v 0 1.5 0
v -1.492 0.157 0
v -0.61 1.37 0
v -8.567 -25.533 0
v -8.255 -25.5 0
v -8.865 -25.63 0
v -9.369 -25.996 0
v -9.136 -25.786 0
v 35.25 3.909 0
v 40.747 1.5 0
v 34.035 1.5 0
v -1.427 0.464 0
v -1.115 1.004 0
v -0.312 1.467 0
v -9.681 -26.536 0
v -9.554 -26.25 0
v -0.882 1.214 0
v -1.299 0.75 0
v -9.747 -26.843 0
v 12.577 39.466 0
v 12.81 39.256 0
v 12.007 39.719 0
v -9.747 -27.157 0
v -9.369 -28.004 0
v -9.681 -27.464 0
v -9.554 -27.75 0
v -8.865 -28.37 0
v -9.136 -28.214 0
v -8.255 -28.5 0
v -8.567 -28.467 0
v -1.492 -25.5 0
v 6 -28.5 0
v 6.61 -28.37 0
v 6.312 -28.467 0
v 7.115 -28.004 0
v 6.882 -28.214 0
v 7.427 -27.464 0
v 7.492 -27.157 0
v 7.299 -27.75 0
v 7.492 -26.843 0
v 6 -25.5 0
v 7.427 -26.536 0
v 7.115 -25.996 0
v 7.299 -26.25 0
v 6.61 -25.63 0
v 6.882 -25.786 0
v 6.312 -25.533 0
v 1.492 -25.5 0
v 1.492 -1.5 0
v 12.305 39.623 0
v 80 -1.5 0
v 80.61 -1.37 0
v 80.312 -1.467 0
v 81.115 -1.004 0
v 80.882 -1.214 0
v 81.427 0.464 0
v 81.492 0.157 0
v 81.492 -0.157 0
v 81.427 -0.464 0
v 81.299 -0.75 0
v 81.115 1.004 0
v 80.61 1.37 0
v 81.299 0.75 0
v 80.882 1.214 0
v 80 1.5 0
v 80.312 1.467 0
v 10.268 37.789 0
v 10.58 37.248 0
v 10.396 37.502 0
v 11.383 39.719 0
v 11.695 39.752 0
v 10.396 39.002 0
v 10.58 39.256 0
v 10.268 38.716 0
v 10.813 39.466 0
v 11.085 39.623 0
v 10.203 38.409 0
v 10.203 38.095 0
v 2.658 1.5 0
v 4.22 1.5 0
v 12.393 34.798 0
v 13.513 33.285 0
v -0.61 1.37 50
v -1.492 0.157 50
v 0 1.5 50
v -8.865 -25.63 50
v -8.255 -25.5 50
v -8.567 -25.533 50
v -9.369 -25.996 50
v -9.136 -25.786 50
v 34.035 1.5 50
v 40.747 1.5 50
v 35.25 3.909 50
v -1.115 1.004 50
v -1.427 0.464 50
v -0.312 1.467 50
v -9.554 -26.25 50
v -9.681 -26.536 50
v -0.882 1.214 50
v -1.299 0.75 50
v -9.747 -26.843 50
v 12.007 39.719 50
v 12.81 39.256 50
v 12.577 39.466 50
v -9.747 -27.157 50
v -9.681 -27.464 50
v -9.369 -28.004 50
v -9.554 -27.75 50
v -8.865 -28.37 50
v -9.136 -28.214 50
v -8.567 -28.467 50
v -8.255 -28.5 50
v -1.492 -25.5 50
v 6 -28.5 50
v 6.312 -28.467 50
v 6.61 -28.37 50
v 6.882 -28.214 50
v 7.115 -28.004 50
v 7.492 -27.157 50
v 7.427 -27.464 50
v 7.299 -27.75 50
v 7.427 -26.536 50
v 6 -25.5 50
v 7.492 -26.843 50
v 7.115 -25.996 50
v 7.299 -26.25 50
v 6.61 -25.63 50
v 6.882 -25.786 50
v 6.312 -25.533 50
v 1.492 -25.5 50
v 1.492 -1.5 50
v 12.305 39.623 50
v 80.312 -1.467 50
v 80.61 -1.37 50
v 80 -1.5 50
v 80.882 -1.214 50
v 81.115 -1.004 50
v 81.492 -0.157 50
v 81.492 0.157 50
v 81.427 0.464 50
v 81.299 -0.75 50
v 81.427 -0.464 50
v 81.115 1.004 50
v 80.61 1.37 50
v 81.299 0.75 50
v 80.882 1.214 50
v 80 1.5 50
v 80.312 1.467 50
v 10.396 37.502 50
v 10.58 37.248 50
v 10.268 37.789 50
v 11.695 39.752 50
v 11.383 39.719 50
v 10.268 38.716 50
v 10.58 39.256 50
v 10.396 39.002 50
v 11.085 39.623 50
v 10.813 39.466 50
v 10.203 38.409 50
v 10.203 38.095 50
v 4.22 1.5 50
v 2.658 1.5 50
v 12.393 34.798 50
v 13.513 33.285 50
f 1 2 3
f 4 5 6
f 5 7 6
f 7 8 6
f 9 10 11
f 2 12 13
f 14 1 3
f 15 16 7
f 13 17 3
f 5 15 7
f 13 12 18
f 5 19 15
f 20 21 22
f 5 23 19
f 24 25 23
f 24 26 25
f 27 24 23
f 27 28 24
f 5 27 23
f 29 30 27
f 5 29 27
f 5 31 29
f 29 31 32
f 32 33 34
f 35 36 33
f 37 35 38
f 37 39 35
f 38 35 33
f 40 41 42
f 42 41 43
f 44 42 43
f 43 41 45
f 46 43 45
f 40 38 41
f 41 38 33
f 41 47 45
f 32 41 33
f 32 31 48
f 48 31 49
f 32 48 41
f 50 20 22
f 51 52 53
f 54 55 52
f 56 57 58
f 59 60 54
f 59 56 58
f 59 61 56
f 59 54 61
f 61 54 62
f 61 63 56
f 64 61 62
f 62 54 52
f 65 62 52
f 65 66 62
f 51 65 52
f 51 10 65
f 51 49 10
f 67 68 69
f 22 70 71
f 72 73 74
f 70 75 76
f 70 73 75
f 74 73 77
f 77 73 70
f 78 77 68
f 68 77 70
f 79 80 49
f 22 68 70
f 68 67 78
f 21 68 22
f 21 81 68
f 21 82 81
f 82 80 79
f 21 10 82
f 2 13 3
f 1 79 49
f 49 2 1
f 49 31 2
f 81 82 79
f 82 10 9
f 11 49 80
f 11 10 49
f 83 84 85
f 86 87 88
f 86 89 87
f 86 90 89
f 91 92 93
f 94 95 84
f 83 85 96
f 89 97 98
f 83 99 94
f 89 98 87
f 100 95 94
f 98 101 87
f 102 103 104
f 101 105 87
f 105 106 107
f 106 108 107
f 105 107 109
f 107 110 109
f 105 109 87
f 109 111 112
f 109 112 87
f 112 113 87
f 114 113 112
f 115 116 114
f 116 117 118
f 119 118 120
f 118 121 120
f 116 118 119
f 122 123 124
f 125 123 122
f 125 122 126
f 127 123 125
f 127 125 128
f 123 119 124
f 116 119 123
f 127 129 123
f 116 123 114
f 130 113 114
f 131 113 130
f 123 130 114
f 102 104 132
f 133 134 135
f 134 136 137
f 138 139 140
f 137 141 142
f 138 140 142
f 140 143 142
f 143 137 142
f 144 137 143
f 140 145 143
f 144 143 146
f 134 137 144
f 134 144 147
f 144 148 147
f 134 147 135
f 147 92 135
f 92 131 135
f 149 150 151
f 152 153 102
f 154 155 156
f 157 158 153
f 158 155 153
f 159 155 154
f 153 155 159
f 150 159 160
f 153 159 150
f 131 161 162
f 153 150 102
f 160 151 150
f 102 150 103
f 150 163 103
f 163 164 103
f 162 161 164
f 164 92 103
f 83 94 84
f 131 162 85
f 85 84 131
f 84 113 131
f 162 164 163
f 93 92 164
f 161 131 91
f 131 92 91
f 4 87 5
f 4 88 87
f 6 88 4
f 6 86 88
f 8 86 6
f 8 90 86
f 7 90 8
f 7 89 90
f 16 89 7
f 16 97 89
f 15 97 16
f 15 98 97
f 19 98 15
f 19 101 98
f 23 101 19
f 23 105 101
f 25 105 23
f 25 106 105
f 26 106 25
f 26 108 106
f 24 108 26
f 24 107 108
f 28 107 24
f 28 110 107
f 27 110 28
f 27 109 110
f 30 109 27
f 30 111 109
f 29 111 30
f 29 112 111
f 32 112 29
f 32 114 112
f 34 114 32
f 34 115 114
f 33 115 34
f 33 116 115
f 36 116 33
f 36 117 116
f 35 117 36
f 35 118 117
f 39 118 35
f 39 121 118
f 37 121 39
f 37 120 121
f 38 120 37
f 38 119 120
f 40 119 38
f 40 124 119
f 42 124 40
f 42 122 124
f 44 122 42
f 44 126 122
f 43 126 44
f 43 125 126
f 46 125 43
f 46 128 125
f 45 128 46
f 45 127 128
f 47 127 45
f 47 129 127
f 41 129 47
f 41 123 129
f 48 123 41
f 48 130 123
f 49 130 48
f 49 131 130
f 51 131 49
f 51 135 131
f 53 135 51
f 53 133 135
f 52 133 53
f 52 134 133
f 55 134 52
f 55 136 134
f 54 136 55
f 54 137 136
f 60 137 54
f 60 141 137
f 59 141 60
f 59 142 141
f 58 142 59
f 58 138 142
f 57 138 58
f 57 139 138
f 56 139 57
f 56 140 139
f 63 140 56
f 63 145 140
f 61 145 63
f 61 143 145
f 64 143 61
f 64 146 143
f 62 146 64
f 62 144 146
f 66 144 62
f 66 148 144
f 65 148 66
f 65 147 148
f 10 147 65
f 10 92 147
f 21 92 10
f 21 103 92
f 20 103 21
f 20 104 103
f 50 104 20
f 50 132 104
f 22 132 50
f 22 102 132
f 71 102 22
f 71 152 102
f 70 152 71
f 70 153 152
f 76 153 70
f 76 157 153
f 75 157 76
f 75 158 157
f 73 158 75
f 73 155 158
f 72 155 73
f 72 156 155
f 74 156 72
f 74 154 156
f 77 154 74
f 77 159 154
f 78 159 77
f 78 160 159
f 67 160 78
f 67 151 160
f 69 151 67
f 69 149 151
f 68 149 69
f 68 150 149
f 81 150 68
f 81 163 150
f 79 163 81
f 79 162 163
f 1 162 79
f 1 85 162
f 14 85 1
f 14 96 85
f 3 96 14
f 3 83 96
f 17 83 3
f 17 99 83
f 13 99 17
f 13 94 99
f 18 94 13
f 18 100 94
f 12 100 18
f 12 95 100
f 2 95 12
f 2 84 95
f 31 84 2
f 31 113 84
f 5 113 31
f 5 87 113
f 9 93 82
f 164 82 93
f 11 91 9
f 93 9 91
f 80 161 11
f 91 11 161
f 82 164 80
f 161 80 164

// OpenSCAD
//CUSTOMIZER VARIABLES

// The width of the stand when looking from the front
stand_width = 50;

// The depth of the spot in which the stood object sits
bottom_depth = 24;

// The height of the stand measured up the backrest
backrest_height = 80;

// The angle that the stood object leans back
lean_angle = 17;

// The distance between the points of contact when the stand is leaned back
base_distance = 40;

// The height at which the prop intersects with the backrest
join_height = 40;

// The height of the lip
lip_height = 6;

// The thickness of all parts of the stand
structure_thickness = 3;

// Whether to place an edge holder on the side(s) of the stand
edge_holder = 0; // [0:None, 1:Left, 2:Right, 3:Both]

//CUSTOMIZER VARIABLES END

module stand(width=stand_width, depth=bottom_depth, height=backrest_height, angle=lean_angle, base=base_distance, join=join_height, lip=lip_height, thickness=structure_thickness, edge=edge_holder) {
    backrest_top = [0,height,0];
    backrest_bottom = [0,0,0];
    holder_front = [depth+thickness,0,0];
    lip_top = [holder_front[0],lip,0];
    lip_bottom = [holder_front[0],-(depth+thickness)*tan(angle),0];
    prop_join = [0,join,0];
    prop_bottom = [-cos(angle)*base,sin(angle)*base,0];
    prop_angle = atan2(cos(angle)*base,join-sin(angle)*base);
    fillet_angle = prop_angle/2;
    fillet_end = [-tan(prop_angle)*thickness,prop_join[1]-thickness,0];
    fillet_join = [prop_join[0],fillet_end[1]-tan(fillet_angle)*(tan(prop_angle)*thickness),0];
    strut_end = [prop_bottom[0]+cos(90-prop_angle)*thickness,prop_bottom[1]+sin(90-prop_angle)*thickness,0];
    strut_join = [0,thickness,0];

    // Add some width to accomodate the edges, if included
    total_width = width + ((edge == 1 || edge == 3) ? thickness : 0) + ((edge == 2 || edge == 3) ? thickness : 0);
    
    // Flip the whole thing over for easier printing if there's a holder on the left side
    rotate_all = edge == 1 ? [0, 180, 0] : [0, 0, 0];
    translate_all = edge == 1 ? [0, 0, total_width] : [0, 0, 0];

    translate(translate_all) rotate(rotate_all) {
        linear_extrude(height = total_width)
        {
            // Backrest
            hull() {
                translate(backrest_top) circle(d=thickness);
                translate(backrest_bottom) circle(d=thickness);
            }
            // Stand
            hull() {
                translate(prop_join) circle(d=thickness);
                //translate([prop_join[0],max(prop_join[1], 0),prop_join[2]]) circle(d=thickness);
                translate(prop_bottom) circle(d=thickness);
            }
            // Fillet
            hull() {
                translate(fillet_join) circle(d=thickness);
                translate(fillet_end) circle(d=thickness);
            }
            // Strut
            hull () {
                translate(strut_join) circle(d=thickness/2);
                translate(strut_end) circle(d=thickness/2);
            }
            // Holder
            hull() {
                translate(backrest_bottom) circle(d=thickness);
                translate(holder_front) circle(d=thickness);
            }
            // Lip
            hull() {
//                translate(holder_front) circle(d=thickness);
                translate(lip_top) circle(d=thickness);
                translate(lip_bottom) circle(d=thickness);
            }
        }
        // Left edge holder
        if (edge == 1 || edge == 3) {
            translate([0, 0, total_width - thickness]) linear_extrude(height = thickness)
            hull() {
                translate(backrest_top) circle(d=thickness);
                translate(backrest_bottom) circle(d=thickness);
                translate(holder_front) circle(d=thickness);
                translate(lip_top) circle(d=thickness);
            }
        }
        // Right edge holder
        if (edge == 2 || edge == 3) {
            linear_extrude(height = thickness)
            hull() {
                translate(backrest_top) circle(d=thickness);
                translate(backrest_bottom) circle(d=thickness);
                translate(holder_front) circle(d=thickness);
                translate(lip_top) circle(d=thickness);
	        }
        }
    }
}

module stand_smooth() {
    // Make smoother curved surfaces by generating the stand scaled
    // up 16x, then scaling back by 1/16.
    scale([1/16, 1/16, 1/16])  {
        stand(width=stand_width*16, depth=bottom_depth*16, height=backrest_height*16,
              angle=lean_angle, base=base_distance*16, join=join_height*16,
              lip=lip_height*16, thickness=structure_thickness*16, edge=edge_holder);
    }
}

module stand_rotated() {
    // Rotate so that the biggest surfaces fall on the X-axis, which
    // is easier to move for many 3D printers. Have the front faces
    // face in the -Y direction which means they can be easily
    // observed during printing on many printers.
    rotate([0,0,-90]) stand_smooth();
}

stand_rotated();
